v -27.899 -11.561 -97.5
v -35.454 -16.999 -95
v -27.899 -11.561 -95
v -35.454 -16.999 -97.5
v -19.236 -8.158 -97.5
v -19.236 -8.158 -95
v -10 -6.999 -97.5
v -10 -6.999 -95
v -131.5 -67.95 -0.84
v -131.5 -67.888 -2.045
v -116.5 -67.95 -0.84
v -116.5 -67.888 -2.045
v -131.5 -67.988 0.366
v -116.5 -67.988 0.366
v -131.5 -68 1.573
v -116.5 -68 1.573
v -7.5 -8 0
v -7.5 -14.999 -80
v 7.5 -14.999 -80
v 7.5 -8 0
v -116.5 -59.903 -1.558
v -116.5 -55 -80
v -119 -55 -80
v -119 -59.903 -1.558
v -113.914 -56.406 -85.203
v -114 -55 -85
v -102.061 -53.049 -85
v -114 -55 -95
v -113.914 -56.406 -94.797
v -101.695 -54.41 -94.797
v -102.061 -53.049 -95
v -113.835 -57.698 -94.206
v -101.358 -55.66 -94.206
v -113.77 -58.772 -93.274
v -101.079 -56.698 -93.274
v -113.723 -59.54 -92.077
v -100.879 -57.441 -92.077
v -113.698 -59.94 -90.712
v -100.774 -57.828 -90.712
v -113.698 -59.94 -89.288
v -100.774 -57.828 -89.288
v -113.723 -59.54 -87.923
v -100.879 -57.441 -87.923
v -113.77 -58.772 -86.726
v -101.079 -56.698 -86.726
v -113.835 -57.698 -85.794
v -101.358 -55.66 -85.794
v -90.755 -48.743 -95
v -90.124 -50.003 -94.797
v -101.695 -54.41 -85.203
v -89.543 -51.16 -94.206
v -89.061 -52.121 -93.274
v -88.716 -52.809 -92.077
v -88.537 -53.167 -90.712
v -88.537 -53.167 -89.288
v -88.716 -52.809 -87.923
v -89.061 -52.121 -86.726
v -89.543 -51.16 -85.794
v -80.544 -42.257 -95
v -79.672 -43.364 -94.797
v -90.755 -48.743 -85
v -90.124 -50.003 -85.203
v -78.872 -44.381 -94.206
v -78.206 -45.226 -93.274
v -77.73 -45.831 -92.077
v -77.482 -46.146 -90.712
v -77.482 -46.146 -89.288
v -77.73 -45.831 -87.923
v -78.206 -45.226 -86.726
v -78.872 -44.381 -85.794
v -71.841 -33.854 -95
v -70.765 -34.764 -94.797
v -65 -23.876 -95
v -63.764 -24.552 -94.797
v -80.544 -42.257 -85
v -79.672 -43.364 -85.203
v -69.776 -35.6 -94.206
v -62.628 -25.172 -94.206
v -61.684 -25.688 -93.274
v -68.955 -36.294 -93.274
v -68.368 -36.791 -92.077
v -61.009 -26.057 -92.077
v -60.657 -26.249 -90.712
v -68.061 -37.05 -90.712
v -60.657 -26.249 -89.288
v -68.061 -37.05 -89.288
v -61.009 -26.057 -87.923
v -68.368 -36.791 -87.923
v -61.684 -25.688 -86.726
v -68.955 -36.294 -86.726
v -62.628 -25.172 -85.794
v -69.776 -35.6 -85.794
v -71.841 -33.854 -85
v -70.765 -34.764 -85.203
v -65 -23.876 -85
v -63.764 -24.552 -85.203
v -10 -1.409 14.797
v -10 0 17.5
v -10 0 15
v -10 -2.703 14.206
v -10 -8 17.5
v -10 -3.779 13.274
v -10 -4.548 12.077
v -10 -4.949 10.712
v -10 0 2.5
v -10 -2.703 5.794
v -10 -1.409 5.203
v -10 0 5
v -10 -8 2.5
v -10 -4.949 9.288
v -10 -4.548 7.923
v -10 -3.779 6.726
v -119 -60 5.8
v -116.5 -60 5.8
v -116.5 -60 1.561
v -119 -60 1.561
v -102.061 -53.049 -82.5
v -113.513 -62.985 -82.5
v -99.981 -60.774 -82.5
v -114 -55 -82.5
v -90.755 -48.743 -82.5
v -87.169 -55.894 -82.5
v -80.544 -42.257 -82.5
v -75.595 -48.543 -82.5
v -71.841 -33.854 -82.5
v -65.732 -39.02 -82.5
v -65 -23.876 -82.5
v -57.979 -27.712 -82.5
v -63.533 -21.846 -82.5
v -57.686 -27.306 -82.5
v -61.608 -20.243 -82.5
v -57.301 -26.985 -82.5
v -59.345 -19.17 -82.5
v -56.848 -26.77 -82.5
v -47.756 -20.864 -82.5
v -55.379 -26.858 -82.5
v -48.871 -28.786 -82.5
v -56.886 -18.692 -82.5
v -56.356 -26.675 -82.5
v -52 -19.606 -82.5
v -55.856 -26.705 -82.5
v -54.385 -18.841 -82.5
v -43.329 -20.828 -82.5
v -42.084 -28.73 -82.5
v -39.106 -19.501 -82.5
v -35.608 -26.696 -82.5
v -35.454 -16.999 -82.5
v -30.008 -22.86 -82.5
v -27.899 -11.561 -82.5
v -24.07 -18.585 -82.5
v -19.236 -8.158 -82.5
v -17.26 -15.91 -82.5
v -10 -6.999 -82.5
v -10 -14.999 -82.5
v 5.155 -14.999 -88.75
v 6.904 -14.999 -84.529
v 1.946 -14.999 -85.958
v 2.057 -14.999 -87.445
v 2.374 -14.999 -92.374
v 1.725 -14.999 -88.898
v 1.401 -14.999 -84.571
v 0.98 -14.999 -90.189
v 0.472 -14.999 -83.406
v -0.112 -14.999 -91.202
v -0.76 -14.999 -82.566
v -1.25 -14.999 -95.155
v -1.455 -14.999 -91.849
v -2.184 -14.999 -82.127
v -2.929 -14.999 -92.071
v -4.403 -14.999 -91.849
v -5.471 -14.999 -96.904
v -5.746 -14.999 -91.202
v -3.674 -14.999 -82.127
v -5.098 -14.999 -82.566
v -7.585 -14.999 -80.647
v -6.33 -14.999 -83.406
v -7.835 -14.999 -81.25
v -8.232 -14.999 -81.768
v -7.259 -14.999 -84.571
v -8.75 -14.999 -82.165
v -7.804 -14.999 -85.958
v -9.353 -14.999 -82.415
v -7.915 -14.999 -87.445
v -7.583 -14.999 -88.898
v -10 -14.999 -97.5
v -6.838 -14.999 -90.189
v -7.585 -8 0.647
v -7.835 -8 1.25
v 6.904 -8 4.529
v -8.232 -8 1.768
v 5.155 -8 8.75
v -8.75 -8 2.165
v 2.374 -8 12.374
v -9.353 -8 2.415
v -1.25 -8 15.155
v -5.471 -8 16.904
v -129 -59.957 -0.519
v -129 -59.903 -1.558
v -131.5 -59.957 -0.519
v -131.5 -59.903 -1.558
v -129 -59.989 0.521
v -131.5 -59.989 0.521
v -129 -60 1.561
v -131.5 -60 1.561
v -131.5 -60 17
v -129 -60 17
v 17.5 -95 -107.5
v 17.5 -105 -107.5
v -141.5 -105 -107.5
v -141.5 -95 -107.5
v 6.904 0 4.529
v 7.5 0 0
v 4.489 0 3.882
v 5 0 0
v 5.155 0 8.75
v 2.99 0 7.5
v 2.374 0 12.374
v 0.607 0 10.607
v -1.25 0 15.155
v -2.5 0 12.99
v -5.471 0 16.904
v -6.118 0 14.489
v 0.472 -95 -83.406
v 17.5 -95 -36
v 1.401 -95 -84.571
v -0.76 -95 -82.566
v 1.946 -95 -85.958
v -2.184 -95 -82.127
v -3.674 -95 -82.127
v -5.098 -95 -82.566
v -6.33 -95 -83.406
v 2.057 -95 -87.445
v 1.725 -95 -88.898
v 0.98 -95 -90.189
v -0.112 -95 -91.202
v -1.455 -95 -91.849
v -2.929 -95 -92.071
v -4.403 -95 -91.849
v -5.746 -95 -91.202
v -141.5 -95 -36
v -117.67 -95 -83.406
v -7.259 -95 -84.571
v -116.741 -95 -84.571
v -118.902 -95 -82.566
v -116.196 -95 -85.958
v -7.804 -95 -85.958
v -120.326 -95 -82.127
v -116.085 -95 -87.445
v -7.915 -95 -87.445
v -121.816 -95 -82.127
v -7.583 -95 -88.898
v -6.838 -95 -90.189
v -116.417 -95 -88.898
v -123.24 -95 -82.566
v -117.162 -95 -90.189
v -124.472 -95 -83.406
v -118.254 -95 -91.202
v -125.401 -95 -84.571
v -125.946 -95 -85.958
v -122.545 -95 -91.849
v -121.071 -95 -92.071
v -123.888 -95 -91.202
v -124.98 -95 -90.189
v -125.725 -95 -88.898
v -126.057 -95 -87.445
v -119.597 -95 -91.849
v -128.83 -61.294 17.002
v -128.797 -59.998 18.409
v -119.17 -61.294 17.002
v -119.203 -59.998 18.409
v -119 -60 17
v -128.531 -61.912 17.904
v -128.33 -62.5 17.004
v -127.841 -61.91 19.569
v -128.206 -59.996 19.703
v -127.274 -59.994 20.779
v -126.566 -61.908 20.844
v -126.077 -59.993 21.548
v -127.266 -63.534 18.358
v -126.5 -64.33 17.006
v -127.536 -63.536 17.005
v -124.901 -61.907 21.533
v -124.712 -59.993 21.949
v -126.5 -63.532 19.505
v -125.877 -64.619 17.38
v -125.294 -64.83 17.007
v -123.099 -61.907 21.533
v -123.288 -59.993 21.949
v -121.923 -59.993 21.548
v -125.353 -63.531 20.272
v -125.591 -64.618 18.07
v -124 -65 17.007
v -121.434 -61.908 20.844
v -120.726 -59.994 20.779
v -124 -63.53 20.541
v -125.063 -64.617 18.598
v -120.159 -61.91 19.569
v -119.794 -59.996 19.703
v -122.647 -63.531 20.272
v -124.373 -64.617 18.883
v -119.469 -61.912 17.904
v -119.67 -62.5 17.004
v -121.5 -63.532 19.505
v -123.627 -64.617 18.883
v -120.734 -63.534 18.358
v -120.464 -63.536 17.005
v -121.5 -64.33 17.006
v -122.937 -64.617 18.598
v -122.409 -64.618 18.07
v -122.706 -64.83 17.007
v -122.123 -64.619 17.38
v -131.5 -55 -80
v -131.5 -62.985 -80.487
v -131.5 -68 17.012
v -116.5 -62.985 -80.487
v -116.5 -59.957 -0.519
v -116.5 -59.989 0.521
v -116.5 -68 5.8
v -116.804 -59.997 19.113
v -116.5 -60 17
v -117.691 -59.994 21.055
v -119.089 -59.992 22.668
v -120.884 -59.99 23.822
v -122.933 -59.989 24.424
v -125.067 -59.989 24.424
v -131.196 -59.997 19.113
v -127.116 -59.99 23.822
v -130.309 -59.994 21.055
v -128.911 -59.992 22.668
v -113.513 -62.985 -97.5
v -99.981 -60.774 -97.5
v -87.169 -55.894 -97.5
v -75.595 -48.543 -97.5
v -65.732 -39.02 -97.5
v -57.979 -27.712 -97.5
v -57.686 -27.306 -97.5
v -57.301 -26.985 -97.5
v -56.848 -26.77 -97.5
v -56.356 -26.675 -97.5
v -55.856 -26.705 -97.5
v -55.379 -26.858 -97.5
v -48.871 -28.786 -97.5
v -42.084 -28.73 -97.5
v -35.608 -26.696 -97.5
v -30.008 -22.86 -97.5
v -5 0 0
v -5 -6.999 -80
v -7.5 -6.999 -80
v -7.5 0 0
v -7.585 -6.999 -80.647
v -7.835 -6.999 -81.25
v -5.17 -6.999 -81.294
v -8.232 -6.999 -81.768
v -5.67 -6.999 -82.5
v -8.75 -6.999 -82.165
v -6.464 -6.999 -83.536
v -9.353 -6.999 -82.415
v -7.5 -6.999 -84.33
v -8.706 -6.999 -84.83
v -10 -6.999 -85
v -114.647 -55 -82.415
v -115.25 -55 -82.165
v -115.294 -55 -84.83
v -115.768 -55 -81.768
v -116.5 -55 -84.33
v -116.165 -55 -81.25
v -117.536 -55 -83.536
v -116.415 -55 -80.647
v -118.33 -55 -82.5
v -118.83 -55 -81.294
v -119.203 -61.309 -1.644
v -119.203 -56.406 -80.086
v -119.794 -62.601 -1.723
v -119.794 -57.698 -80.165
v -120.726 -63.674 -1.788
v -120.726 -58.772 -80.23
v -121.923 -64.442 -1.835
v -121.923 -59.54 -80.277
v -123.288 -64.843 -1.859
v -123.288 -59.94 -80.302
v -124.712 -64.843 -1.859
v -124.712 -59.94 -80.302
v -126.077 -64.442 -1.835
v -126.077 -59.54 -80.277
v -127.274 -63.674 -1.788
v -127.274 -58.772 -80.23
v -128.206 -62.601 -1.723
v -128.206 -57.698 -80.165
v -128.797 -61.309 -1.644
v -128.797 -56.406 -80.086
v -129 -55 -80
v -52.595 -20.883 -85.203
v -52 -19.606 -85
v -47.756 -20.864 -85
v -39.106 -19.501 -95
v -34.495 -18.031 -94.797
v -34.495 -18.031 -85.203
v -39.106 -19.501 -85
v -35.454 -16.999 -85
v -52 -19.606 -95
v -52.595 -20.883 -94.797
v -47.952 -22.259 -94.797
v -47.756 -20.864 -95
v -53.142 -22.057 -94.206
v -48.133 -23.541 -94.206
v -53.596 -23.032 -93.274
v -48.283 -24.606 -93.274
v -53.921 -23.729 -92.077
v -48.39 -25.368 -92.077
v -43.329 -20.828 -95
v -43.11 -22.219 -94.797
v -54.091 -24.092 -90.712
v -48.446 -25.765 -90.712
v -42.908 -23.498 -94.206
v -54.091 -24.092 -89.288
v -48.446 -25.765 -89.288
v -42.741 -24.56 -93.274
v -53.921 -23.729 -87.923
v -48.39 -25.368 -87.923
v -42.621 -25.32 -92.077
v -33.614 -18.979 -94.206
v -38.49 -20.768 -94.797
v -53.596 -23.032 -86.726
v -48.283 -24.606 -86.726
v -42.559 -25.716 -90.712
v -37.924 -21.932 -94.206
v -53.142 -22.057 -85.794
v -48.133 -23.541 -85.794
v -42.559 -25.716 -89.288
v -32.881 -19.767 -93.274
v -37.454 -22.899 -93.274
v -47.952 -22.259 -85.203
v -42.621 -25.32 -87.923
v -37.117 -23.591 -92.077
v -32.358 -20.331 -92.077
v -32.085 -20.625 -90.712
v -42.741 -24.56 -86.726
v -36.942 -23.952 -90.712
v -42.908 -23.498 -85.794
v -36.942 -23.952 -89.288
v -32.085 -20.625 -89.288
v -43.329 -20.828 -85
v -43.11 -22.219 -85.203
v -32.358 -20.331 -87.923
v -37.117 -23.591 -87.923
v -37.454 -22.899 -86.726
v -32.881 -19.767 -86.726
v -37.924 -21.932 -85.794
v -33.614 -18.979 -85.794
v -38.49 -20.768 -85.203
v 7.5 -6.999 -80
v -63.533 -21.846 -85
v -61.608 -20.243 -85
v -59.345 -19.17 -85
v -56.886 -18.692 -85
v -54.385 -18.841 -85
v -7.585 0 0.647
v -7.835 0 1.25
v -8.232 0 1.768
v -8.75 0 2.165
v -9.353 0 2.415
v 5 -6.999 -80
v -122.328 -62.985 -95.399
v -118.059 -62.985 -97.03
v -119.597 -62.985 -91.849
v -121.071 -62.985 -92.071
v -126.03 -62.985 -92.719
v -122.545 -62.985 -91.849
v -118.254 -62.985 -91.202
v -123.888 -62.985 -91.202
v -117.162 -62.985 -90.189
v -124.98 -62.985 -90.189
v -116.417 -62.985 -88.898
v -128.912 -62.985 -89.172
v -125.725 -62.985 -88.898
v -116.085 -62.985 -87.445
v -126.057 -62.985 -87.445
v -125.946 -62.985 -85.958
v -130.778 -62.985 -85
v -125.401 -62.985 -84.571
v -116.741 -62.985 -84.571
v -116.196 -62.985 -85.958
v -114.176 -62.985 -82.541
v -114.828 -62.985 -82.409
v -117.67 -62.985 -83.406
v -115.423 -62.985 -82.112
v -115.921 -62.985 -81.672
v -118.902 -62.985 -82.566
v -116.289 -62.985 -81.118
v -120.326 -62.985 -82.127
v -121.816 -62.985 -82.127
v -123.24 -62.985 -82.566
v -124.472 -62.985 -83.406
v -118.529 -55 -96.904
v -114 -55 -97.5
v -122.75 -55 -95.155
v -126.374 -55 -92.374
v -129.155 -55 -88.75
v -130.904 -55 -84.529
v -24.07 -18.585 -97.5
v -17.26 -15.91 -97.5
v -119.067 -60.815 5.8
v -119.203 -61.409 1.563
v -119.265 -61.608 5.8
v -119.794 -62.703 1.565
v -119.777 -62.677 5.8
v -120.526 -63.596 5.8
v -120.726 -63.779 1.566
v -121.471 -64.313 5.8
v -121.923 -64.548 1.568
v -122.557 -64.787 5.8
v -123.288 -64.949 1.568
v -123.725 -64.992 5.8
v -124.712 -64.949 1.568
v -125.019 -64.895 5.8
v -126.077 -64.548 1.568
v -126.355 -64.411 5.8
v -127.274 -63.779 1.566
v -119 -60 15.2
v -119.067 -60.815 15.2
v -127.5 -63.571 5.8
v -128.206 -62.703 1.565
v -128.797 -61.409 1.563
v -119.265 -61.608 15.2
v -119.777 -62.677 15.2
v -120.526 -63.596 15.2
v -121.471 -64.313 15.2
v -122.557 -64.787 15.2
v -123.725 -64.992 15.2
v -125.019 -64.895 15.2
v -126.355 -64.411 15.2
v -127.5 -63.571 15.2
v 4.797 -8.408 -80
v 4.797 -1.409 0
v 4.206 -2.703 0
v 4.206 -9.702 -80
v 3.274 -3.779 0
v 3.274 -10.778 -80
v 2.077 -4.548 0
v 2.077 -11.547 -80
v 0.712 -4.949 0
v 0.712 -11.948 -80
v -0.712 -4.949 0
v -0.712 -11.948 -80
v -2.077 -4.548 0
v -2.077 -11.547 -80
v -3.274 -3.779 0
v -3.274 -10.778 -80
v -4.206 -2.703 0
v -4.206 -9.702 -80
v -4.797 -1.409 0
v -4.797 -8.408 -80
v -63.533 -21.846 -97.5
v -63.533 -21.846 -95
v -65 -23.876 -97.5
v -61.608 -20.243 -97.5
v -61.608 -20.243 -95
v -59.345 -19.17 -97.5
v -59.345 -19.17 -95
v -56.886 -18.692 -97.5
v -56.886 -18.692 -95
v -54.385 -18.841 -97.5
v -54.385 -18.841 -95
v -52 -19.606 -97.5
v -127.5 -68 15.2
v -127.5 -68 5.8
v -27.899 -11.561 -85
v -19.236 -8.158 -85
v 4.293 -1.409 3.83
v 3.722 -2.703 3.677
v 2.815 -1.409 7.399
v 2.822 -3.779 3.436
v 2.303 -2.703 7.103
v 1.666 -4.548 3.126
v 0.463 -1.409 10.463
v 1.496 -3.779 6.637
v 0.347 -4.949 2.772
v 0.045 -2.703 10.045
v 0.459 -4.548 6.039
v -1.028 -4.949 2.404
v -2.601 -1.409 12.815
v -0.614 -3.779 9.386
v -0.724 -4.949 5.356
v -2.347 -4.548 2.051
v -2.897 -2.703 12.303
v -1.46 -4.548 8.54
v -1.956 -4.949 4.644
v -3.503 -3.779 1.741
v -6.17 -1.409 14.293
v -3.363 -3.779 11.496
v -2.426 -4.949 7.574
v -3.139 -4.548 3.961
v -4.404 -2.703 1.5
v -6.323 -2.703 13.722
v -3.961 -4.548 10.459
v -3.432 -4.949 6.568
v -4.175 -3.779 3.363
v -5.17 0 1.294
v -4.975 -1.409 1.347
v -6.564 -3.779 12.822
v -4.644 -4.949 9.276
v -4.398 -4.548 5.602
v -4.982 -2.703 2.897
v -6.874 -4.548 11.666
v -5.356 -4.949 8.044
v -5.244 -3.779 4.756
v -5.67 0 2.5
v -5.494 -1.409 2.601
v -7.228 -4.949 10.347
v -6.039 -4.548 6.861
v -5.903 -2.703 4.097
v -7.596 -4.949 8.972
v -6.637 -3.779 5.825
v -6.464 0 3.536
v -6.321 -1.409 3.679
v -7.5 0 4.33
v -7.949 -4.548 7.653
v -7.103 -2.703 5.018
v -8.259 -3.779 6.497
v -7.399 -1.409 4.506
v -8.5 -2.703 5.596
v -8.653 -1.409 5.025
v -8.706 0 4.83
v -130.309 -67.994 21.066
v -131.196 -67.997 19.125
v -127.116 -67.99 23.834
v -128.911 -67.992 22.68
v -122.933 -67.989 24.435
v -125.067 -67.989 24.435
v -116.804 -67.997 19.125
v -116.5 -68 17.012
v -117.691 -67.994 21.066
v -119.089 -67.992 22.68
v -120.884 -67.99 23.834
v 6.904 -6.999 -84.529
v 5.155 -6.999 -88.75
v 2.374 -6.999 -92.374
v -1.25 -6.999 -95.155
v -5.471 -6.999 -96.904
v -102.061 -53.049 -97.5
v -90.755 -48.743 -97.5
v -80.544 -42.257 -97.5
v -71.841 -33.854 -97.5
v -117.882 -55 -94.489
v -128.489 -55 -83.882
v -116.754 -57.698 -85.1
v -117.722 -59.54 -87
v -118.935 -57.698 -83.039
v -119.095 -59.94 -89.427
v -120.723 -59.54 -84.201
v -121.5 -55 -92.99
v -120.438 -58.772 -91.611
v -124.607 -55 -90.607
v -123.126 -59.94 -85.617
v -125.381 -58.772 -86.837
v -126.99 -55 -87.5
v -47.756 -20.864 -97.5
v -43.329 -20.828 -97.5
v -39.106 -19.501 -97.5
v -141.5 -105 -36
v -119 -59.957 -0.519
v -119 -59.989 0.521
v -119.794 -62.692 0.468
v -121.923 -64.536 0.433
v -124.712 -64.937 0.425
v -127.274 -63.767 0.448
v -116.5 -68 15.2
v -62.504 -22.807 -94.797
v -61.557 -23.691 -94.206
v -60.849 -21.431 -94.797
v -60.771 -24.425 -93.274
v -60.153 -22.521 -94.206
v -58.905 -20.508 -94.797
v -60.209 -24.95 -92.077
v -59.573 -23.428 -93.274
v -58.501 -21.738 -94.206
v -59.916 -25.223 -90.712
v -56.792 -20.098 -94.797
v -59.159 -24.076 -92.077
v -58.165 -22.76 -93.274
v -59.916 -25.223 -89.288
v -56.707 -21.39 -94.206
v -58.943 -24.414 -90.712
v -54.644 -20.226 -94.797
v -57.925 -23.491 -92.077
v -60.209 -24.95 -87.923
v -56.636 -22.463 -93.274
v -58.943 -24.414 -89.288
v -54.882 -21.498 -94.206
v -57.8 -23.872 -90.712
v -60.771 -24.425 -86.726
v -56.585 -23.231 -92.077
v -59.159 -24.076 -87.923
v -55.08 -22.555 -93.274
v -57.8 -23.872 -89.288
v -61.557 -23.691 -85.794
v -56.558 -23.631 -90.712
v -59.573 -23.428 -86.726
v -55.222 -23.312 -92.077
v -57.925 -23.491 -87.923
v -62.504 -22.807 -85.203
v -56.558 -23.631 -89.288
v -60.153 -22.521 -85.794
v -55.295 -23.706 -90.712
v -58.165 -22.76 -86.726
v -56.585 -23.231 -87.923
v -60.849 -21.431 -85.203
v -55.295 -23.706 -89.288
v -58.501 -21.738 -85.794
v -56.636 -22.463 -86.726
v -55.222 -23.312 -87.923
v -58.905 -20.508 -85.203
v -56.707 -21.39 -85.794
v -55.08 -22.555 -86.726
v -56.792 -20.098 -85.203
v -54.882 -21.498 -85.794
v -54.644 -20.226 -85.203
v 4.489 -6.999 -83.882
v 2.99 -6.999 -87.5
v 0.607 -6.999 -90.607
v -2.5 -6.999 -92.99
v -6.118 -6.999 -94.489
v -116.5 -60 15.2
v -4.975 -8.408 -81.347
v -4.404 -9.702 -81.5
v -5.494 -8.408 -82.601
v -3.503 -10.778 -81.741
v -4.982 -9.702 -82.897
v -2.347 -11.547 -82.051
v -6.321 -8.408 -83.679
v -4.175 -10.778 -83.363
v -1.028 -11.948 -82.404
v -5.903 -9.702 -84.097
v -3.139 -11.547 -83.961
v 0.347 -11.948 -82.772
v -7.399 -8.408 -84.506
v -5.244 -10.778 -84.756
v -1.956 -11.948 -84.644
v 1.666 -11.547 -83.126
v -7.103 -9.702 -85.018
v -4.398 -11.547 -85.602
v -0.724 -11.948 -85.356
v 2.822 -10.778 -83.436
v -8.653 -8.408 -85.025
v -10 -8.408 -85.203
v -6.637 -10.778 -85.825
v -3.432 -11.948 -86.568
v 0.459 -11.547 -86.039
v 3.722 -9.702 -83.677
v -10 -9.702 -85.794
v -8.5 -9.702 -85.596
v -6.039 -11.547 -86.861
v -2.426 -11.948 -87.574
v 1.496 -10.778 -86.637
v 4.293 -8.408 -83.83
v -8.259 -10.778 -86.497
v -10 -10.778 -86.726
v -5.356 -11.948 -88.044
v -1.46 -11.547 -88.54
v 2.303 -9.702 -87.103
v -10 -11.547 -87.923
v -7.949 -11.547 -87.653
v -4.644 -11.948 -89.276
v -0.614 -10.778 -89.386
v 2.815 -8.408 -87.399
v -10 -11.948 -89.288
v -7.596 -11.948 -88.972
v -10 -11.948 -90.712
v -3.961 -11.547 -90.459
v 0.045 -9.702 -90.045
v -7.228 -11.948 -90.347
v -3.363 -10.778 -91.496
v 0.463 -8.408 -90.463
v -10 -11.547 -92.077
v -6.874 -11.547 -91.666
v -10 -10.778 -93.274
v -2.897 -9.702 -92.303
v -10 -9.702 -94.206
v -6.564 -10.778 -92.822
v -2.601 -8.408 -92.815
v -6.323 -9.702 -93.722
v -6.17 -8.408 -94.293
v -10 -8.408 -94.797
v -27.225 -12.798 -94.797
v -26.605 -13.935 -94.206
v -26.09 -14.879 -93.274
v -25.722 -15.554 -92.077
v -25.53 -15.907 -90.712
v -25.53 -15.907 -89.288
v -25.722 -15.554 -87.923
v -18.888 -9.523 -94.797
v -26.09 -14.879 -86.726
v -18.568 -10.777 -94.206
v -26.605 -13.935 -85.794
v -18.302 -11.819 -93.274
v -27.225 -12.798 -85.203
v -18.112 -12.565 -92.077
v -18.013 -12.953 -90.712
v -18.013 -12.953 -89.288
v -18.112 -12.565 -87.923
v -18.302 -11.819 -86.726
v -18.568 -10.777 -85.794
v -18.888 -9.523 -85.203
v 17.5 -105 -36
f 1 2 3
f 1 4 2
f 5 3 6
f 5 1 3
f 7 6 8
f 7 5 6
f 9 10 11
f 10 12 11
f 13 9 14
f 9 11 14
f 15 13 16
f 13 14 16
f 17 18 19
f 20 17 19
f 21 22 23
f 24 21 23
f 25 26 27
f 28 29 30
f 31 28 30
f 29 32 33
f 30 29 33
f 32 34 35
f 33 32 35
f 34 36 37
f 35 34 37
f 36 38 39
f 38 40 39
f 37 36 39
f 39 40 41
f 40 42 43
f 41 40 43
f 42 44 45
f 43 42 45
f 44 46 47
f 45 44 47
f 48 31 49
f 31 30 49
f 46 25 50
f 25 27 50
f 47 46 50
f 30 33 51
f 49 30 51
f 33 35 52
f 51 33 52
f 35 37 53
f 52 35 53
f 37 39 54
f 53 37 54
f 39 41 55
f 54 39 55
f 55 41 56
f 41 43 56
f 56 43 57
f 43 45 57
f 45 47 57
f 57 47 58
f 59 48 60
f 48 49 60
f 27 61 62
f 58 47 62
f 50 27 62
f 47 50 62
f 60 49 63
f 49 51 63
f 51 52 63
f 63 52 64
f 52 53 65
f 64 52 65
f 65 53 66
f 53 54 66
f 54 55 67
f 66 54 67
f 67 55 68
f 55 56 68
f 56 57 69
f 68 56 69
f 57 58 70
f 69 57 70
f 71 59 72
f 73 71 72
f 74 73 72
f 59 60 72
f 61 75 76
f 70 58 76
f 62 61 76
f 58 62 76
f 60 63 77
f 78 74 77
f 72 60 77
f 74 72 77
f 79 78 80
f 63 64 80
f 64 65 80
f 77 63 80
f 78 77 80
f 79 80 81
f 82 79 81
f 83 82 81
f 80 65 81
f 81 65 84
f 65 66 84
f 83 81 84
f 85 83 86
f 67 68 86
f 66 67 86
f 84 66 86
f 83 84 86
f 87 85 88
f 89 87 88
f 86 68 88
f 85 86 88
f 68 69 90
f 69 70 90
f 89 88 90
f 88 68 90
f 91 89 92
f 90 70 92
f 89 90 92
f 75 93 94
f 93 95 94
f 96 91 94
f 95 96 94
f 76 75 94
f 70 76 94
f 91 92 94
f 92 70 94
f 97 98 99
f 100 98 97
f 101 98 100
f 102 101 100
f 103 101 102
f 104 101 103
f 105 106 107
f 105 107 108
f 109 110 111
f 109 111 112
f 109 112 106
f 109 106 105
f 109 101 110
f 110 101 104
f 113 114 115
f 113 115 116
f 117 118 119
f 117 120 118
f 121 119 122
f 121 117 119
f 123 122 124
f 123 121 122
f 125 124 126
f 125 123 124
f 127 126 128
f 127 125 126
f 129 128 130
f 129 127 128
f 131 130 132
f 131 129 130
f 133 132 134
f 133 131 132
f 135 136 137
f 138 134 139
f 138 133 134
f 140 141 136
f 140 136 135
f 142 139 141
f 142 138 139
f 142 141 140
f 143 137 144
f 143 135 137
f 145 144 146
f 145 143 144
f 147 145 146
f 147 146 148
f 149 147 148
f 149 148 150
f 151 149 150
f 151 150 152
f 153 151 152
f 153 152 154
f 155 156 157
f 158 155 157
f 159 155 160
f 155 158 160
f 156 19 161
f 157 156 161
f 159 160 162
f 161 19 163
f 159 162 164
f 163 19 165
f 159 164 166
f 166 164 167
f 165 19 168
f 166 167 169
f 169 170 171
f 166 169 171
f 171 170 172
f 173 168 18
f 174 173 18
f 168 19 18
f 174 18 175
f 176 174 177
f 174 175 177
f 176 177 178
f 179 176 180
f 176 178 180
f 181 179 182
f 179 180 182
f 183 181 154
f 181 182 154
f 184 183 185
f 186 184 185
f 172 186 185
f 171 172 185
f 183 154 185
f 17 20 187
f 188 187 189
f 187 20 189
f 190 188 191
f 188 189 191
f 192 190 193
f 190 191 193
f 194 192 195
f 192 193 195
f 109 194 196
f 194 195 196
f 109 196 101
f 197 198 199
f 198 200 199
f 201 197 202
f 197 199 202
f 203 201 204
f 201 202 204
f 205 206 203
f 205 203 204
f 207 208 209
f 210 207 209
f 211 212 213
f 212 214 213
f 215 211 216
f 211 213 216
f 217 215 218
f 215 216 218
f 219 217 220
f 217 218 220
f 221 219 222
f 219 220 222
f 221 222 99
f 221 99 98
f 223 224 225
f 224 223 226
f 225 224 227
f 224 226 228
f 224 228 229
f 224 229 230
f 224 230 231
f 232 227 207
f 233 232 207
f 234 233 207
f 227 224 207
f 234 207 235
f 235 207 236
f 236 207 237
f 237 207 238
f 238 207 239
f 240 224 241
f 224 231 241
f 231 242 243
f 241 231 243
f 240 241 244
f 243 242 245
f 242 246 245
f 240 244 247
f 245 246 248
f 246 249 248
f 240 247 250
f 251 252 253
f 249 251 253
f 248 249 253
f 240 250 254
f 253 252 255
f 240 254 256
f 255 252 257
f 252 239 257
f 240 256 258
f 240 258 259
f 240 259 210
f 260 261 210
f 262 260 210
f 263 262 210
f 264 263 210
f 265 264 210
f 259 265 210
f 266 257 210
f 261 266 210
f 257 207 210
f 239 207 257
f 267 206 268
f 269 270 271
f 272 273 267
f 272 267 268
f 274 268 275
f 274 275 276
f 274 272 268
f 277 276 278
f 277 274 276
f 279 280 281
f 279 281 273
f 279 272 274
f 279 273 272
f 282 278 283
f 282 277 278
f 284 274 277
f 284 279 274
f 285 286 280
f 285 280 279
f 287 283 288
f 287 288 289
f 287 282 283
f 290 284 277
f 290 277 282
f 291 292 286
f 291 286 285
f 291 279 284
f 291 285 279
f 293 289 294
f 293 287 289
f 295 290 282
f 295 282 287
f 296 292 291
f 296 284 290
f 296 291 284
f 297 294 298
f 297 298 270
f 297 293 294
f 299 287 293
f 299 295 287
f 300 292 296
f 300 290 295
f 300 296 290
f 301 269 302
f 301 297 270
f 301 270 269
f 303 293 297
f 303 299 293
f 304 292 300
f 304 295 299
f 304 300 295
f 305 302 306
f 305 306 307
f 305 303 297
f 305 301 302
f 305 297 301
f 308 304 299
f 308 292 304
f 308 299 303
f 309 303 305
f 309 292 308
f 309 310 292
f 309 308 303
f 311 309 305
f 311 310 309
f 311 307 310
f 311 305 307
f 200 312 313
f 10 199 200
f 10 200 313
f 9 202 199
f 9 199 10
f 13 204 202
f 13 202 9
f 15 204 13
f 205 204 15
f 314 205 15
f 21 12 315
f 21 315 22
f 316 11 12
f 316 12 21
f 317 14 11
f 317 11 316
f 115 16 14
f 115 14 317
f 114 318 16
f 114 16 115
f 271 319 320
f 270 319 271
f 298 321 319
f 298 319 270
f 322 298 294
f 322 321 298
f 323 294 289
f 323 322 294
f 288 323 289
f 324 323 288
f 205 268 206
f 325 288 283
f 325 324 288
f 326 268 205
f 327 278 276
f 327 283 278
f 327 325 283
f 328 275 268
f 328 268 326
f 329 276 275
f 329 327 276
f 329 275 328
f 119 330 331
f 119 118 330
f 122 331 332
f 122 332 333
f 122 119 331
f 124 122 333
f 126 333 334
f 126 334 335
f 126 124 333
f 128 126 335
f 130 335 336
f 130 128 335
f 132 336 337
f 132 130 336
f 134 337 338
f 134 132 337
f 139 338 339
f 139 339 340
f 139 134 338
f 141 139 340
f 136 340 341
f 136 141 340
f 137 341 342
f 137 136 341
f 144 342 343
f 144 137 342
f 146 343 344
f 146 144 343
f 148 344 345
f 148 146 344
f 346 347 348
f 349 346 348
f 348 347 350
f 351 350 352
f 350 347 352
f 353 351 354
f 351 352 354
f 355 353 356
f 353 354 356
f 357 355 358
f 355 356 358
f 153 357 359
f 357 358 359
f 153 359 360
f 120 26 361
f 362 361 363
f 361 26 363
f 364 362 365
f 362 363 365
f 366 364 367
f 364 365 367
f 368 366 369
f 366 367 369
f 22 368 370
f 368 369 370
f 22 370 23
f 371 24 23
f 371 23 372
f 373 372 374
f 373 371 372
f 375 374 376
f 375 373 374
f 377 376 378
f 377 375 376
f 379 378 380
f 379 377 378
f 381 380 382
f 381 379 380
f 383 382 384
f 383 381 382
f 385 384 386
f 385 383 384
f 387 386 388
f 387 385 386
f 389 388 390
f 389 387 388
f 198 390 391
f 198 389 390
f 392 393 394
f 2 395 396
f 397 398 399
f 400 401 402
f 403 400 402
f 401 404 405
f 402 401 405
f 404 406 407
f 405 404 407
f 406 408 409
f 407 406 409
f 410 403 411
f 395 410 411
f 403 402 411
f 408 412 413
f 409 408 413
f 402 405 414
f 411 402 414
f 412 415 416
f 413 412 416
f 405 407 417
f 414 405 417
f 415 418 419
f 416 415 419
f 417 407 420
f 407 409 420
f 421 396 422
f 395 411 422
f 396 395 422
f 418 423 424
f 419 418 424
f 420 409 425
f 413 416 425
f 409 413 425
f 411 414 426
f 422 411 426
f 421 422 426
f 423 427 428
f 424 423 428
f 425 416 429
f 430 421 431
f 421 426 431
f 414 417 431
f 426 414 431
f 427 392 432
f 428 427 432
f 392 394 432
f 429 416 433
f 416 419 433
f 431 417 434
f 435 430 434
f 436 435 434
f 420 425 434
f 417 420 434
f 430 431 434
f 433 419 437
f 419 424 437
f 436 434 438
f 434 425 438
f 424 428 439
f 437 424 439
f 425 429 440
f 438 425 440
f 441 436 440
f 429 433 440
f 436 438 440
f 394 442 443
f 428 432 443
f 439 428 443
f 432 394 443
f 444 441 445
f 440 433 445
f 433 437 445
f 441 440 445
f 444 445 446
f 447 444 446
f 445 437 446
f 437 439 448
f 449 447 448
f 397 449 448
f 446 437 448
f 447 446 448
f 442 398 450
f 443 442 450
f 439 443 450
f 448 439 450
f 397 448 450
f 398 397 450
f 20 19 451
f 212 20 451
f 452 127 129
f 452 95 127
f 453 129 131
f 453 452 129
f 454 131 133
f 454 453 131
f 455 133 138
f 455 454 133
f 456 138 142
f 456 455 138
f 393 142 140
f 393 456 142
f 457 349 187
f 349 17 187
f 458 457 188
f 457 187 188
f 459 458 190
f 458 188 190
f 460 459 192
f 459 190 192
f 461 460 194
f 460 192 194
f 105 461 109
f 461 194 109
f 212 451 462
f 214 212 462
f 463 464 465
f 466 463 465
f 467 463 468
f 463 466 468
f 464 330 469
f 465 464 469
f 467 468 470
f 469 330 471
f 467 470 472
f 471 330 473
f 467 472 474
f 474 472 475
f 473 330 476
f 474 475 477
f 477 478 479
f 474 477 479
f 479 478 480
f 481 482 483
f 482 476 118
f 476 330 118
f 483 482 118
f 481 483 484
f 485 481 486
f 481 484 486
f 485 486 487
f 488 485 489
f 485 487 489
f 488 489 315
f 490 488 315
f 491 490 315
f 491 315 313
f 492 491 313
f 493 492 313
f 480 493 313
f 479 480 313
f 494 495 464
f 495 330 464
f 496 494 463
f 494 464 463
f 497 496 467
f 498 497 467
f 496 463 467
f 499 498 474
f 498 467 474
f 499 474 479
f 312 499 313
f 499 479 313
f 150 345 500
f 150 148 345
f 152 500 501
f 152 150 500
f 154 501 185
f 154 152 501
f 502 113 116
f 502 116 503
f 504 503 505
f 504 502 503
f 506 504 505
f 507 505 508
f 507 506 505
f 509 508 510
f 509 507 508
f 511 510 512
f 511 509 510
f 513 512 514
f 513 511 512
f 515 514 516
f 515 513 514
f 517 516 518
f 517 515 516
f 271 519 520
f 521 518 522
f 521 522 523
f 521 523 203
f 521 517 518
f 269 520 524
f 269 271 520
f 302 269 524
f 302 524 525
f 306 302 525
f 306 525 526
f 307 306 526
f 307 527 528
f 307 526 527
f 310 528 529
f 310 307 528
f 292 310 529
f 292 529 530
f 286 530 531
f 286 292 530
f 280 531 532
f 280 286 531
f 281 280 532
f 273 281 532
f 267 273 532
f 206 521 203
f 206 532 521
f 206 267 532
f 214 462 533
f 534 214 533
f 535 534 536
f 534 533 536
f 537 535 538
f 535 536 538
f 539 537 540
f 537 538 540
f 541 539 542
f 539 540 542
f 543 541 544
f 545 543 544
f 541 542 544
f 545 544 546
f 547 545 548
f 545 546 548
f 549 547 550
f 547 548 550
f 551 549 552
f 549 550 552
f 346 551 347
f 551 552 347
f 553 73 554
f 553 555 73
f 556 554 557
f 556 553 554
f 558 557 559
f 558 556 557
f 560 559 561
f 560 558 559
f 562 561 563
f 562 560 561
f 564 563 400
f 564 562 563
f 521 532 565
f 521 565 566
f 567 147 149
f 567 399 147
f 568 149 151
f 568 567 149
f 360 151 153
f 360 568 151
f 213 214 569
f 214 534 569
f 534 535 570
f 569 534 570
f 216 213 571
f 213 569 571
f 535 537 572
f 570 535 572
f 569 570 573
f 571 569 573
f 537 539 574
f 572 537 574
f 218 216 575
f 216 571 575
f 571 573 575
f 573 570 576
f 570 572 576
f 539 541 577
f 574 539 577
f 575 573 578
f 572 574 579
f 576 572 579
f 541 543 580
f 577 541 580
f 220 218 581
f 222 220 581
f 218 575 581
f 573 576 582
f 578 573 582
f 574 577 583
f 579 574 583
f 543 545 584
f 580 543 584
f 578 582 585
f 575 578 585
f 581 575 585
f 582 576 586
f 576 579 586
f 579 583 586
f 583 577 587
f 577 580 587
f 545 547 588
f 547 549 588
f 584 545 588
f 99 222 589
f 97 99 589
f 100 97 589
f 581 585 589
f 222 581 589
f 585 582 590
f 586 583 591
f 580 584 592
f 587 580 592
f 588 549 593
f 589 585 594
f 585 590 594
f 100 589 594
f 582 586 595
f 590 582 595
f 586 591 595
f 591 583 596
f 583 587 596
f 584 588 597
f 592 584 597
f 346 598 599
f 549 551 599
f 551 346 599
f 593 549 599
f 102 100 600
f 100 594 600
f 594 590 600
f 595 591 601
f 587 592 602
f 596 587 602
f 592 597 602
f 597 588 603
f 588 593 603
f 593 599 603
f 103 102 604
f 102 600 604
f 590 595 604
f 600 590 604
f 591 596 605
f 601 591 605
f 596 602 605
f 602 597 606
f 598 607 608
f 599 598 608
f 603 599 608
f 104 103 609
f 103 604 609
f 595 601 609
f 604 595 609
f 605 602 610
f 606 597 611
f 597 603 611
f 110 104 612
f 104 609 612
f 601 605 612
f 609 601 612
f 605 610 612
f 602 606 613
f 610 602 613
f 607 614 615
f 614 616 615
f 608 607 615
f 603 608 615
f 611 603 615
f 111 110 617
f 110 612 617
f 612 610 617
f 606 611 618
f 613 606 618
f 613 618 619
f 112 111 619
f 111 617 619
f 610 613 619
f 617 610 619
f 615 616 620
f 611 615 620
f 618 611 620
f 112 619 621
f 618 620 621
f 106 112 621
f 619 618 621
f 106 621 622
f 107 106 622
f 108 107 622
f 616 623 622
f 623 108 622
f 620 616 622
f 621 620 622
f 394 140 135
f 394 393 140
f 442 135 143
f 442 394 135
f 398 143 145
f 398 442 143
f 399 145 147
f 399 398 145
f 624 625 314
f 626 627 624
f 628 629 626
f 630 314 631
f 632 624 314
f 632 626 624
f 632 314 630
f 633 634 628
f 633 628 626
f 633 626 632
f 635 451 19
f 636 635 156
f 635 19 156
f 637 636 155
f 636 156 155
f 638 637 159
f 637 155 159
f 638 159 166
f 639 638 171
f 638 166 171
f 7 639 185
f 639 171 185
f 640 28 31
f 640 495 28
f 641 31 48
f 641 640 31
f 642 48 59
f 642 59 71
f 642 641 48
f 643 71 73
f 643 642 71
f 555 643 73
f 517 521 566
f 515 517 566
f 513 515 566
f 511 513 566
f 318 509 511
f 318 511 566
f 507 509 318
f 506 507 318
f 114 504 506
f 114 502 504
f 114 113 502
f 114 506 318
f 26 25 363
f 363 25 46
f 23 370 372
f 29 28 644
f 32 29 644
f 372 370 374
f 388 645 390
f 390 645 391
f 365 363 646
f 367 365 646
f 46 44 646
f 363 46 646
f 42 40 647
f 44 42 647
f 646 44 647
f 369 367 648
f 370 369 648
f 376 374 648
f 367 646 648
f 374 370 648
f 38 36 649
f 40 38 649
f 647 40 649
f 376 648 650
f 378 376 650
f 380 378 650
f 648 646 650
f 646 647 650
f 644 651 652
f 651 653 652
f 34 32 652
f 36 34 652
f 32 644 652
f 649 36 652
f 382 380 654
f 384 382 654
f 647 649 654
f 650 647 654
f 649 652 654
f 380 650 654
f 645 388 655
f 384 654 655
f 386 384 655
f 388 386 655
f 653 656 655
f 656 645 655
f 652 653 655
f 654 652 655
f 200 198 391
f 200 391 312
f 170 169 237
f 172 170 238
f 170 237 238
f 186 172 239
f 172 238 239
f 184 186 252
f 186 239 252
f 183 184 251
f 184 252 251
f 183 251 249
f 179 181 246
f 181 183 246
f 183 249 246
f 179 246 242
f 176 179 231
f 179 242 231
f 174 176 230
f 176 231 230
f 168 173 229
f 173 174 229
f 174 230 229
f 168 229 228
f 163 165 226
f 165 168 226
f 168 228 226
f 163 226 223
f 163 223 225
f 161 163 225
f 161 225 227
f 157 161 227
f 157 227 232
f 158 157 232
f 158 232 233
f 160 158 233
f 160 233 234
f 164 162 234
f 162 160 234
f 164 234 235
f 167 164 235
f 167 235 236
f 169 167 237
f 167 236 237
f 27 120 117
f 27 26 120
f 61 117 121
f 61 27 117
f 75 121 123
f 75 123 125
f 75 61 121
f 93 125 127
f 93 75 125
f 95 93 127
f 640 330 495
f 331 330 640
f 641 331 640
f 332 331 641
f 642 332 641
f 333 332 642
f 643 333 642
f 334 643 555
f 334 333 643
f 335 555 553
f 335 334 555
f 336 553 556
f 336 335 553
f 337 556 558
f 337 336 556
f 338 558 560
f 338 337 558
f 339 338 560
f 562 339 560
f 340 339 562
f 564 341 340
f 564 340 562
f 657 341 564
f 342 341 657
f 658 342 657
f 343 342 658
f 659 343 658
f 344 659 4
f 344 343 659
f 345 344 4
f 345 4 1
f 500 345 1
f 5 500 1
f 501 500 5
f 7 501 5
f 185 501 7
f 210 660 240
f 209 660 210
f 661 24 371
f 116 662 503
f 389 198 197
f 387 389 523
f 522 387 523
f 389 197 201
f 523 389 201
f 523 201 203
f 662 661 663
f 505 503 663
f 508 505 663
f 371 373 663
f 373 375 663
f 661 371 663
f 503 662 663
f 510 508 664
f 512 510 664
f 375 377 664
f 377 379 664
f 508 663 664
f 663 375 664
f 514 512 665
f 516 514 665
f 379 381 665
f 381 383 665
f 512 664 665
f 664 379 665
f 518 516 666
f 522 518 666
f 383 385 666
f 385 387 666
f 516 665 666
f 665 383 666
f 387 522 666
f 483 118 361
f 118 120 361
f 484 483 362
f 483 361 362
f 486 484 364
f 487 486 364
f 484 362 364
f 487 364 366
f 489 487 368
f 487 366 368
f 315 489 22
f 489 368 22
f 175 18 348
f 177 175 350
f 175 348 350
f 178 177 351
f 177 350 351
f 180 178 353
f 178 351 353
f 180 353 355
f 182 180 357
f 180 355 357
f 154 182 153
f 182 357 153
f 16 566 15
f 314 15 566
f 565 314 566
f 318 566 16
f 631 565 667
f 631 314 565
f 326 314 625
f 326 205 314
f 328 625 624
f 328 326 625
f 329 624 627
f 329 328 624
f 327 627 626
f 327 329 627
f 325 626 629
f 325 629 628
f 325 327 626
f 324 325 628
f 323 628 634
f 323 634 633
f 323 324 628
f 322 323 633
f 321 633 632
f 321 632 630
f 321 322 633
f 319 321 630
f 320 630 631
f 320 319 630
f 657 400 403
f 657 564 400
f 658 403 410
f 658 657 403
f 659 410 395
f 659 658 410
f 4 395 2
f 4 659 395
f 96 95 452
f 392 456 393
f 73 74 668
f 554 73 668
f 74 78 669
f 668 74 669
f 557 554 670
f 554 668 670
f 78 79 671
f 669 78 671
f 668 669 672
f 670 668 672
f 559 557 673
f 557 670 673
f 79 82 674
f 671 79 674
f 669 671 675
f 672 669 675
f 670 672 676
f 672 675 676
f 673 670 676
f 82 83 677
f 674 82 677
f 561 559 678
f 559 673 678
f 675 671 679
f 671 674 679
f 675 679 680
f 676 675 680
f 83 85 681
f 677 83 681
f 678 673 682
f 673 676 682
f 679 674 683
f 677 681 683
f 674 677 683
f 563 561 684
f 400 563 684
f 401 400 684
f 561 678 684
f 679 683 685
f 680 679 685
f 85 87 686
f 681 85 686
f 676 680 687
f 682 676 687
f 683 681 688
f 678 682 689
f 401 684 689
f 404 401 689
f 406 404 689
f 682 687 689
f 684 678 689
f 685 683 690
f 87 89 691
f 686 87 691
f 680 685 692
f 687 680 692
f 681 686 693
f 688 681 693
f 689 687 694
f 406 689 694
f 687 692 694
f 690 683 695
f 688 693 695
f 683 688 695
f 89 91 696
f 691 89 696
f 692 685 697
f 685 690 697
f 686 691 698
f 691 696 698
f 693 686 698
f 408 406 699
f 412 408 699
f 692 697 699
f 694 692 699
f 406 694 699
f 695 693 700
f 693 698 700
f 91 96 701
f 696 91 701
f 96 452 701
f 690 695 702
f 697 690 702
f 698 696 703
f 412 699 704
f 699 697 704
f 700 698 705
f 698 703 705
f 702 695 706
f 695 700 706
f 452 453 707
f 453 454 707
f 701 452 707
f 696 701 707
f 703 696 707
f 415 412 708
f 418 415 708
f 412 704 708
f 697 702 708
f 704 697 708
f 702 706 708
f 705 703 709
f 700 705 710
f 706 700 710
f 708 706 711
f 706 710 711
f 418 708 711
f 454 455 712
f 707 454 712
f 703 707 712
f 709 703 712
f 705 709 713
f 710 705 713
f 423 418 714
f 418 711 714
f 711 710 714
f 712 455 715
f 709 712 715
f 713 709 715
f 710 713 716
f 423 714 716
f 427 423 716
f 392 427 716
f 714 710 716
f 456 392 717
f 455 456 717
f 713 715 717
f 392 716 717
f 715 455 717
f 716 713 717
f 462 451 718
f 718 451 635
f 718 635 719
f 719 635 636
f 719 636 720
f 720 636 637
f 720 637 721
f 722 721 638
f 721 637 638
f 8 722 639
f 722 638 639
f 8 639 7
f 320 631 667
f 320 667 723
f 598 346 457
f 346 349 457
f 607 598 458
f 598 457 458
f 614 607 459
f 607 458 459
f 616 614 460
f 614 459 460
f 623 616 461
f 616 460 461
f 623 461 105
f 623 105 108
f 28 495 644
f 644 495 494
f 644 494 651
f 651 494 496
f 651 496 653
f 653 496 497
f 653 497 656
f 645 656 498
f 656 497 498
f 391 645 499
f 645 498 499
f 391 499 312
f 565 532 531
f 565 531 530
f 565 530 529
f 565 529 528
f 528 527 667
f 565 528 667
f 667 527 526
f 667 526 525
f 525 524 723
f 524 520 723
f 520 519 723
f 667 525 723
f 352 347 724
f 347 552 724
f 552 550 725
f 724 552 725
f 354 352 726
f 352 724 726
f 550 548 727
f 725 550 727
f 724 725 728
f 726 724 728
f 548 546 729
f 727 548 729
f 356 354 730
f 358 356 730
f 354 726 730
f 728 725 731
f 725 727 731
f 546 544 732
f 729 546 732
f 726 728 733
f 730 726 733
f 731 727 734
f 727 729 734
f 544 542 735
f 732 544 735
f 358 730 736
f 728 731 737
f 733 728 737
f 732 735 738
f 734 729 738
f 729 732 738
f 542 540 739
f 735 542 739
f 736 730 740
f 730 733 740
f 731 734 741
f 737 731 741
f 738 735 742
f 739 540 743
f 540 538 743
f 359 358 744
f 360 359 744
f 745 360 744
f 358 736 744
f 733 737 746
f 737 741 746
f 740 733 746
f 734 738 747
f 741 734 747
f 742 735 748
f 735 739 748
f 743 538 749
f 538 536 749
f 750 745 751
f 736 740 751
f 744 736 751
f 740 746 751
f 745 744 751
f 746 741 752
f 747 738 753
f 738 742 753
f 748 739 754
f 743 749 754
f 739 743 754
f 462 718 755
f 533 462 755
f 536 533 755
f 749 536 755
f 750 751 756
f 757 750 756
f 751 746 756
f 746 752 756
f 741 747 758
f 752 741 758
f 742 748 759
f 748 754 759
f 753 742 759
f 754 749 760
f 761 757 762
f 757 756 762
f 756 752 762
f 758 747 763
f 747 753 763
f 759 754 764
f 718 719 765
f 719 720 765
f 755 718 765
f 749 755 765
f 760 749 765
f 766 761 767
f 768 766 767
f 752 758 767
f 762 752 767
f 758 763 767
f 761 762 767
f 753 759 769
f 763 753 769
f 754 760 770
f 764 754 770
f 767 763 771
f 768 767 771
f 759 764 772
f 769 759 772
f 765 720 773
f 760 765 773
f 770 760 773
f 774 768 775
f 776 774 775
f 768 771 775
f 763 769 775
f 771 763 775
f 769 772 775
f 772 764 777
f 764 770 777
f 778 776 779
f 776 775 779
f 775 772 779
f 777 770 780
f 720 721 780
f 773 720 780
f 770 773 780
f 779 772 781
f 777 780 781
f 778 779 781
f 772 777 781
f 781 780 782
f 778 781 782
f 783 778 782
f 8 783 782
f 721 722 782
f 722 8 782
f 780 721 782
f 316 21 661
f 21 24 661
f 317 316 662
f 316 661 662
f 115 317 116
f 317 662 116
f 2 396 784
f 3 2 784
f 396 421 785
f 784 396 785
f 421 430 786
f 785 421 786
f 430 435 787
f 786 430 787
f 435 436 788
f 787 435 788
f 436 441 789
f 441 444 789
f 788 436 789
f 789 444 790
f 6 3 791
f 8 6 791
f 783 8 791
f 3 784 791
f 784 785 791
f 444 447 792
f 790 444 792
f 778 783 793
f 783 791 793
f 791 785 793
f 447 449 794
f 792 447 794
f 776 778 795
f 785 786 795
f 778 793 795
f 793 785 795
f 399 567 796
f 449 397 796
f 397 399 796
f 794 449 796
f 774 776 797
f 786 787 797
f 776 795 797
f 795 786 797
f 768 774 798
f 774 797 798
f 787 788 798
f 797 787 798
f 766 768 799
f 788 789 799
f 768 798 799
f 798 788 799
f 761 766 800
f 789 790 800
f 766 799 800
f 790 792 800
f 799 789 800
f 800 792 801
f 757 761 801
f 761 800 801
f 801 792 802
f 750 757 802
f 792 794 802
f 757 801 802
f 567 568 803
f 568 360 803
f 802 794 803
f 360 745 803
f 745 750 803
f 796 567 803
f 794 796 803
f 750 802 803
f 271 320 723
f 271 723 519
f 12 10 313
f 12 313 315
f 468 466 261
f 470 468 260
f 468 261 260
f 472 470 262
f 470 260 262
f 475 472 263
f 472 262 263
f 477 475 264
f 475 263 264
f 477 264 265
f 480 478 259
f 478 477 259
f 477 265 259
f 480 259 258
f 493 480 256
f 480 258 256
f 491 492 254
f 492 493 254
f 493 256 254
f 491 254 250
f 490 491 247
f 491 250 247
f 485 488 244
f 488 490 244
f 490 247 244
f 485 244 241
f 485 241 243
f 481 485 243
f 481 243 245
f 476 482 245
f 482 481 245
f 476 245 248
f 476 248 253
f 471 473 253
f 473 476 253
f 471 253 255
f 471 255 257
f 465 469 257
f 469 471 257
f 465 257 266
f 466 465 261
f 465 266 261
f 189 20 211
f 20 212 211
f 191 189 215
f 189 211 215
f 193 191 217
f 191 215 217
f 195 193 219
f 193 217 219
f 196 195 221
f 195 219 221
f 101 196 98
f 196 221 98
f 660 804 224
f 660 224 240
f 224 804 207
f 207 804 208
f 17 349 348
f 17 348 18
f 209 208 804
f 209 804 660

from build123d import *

# Parameters (mm, degrees)
REVOLVE_1_ANGLE     = 180
CUT_EXTRUDE_1_REACH = 179.268
SKETCH_26_W         = 11
SKETCH_26_H         = 9.4
SKETCH_30_W         = 159
SKETCH_30_H         = 71.5
EXTRUDE_3_DEPTH     = 10
EXTRUDE_4_REACH     = 203.503
SKETCH_31_R         = 5


# Read off the part's stored shape, not the designer's step: 旋轉1
with BuildPart() as part:
    # 掃出1: sweep along a path in 草圖1
    with BuildLine(Plane(origin=(0, 0, 0), x_dir=(0, 0, -1), z_dir=(1, 0, 0))) as sweep_1_path:
        Line((0, 0), (80, -6.999093082))
    # 草圖8 → 掃出1 (sweep)
    with BuildSketch(Plane.XY):
        with BuildLine():
            Line((5, 0), (7.5, 0))
            Line((7.5, 0), (7.5, -8))
            Line((7.5, -8), (-7.5, -8))
            Line((-7.5, -8), (-7.5, 0))
            Line((-7.5, 0), (-5, 0))
            ThreePointArc((-5, 0), (0, -5), (5, 0))
        make_face()
    sweep(path=sweep_1_path.line)

    # 掃出2: sweep along a path in 草圖3
    with BuildLine(Plane(origin=(0, -6.999093082, 0), x_dir=(1, 0, 0), z_dir=(0, 1, 0))) as sweep_2_path:
        ThreePointArc((0, 80), (-2.928932188, 87.071067812), (-10, 90))
    # 草圖15 → 掃出2 (sweep)
    with BuildSketch(Plane(origin=(0, 0, -80), x_dir=(-1, 0, 0), z_dir=(0, 0, -1))):
        with BuildLine():
            Line((7.5, -14.999093082), (7.5, -6.999093082))
            Line((7.5, -6.999093082), (5, -6.999093082))
            ThreePointArc((5, -6.999093082), (0, -11.999093082), (-5, -6.999093082))
            Line((-5, -6.999093082), (-7.5, -6.999093082))
            Line((-7.5, -6.999093082), (-7.5, -14.999093082))
            Line((-7.5, -14.999093082), (7.5, -14.999093082))
        make_face()
    sweep(path=sweep_2_path.line)

    # 掃出6: sweep along a path in 草圖4
    with BuildLine(Plane.XY.offset(-90)) as sweep_6_path:
        ThreePointArc((-114, -55), (-85.48557321, -45.758350859), (-65, -23.876351309))
        ThreePointArc((-65, -23.876351309), (-59.344635199, -19.169851161), (-52, -19.606461369))
        ThreePointArc((-52, -19.606461369), (-43.328947167, -20.827564341), (-35.453602253, -16.999093082))
        ThreePointArc((-35.453602253, -16.999093082), (-23.673751019, -9.588764492), (-10, -6.999093082))
    # 草圖19 → 掃出6 (sweep)
    with BuildSketch(Plane.ZY.offset(10)):
        with BuildLine():
            Line((-97.5, -14.999093082), (-82.5, -14.999093082))
            Line((-82.5, -14.999093082), (-82.5, -6.999093082))
            Line((-82.5, -6.999093082), (-85, -6.999093082))
            ThreePointArc((-85, -6.999093082), (-90, -11.999093082), (-95, -6.999093082))
            Line((-95, -6.999093082), (-97.5, -6.999093082))
            Line((-97.5, -6.999093082), (-97.5, -14.999093082))
        make_face()
    sweep(path=sweep_6_path.line)

    # 掃出7: sweep along a path in 草圖5
    with BuildLine(Plane(origin=(0, -55, 0), x_dir=(1, 0, 0), z_dir=(0, 1, 0))) as sweep_7_path:
        ThreePointArc((-114, 90), (-121.071067812, 87.071067812), (-124, 80))
    # 草圖20 → 掃出7 (sweep)
    with BuildSketch(Plane(origin=(-116.921360423, -7.136292944, 0), x_dir=(0, 0, 1), z_dir=(-0.9981425535898466, -0.06092161121589024, 0))):
        with BuildLine():
            Line((-97.5, -47.952776769), (-97.5, -55.952776769))
            Line((-97.5, -55.952776769), (-82.5, -55.952776769))
            Line((-82.5, -55.952776769), (-82.5, -47.952776769))
            Line((-82.5, -47.952776769), (-85, -47.952776769))
            ThreePointArc((-85, -47.952776769), (-90, -52.952776769), (-95, -47.952776769))
            Line((-95, -47.952776769), (-97.5, -47.952776769))
        make_face()
    sweep(path=sweep_7_path.line)

    # 掃出8: sweep along a path in 草圖6
    with BuildLine(Plane(origin=(-124, 0, 0), x_dir=(0, 0, -1), z_dir=(1, 0, 0))) as sweep_8_path:
        Line((80, -55), (1.557937214, -59.902628924))
        ThreePointArc((1.557937214, -59.902628924), (-0.000760155, -59.975651302), (-1.560977094, -60))
        Line((-1.560977094, -60), (-17, -60))
    # 草圖21 → 掃出8 (sweep)
    with BuildSketch(Plane(origin=(0, 4.660546858, -76.358619691), x_dir=(1, 0, 0), z_dir=(0, -0.06092161121589024, 0.9981425535898466))):
        with BuildLine():
            Line((-129, -59.771569345), (-131.5, -59.771569345))
            Line((-131.5, -59.771569345), (-131.5, -67.771569345))
            Line((-131.5, -67.771569345), (-116.5, -67.771569345))
            Line((-116.5, -67.771569345), (-116.5, -59.771569345))
            Line((-116.5, -59.771569345), (-119, -59.771569345))
            ThreePointArc((-119, -59.771569345), (-124, -64.771569345), (-129, -59.771569345))
        make_face()
    sweep(path=sweep_8_path.line)

    # 掃出9: sweep along a path in 草圖22
    with BuildLine(Plane(origin=(0, 0, 0), x_dir=(1, 0, 0), z_dir=(0, 1, 0))) as sweep_9_path:
        ThreePointArc((0, 0), (-2.928932188, -7.071067812), (-10, -10))
    # 草圖23 → 掃出9 (sweep)
    with BuildSketch(Plane.XY):
        with BuildLine():
            Line((-7.5, 0), (-7.5, -8))
            Line((-7.5, -8), (7.5, -8))
            Line((7.5, -8), (7.5, 0))
            Line((7.5, 0), (5, 0))
            ThreePointArc((5, 0), (0, -5), (-5, 0))
            Line((-5, 0), (-7.5, 0))
        make_face()
    sweep(path=sweep_9_path.line)

    # 旋轉1 outline → 旋轉1 (revolve)
    with BuildSketch(Plane(origin=(-124, 0.024682835, 16.912396843), x_dir=(-1, 0, 0), z_dir=(1.4532479245137334e-14, -0.0014594506721384598, -0.9999989350013008))):
        with BuildLine():
            Line((7.5, -68.024746762), (7.5, -60.024746762))
            Line((7.5, -60.024746762), (5, -60.024746762))
            ThreePointArc((5, -60.024746762), (3.535533906, -63.560280668), (0, -65.024746762))
            Line((0, -65.024746762), (0, -68.024746762))
            Line((0, -68.024746762), (7.5, -68.024746762))
        make_face()
    revolve(axis=Axis((-124, 0.024682835, 16.912396843), (0, 0.9999989350013008, -0.0014594506721384598)), revolution_arc=REVOLVE_1_ANGLE)

    # 草圖26 → 除料-伸長1 (cut, up to next)
    with BuildSketch(Plane(origin=(0, 0, 0), x_dir=(1, 0, 0), z_dir=(0, 1, 0)), mode=Mode.PRIVATE) as cut_extrude_1_sk1:
        with Locations((-122, -10.5)):
            Rectangle(SKETCH_26_W, SKETCH_26_H)
    cut_extrude_1_tool1 = extrude(cut_extrude_1_sk1.sketch, amount=-CUT_EXTRUDE_1_REACH, mode=Mode.PRIVATE) & part.part
    add(cut_extrude_1_tool1.solids().sort_by_distance((-122, 0, 10.5))[0], mode=Mode.SUBTRACT)

    # 草圖31 → 填料-伸長4 (add, up to next)
    with BuildSketch(Plane(origin=(0, -95, 0), x_dir=(1, 0, 0), z_dir=(0, 1, 0)), mode=Mode.PRIVATE) as extrude_4_sk1:
        with Locations(Location((-121.071067812, 87.071067812, 0), (0, 0, 90))):
            Circle(SKETCH_31_R)
    extrude_4_tool1 = extrude(extrude_4_sk1.sketch, amount=EXTRUDE_4_REACH, mode=Mode.PRIVATE) - part.part
    # 草圖31 → 填料-伸長4 (add, up to next)
    with BuildSketch(Plane(origin=(0, -95, 0), x_dir=(1, 0, 0), z_dir=(0, 1, 0)), mode=Mode.PRIVATE) as extrude_4_sk2:
        with Locations(Location((-2.928932188, 87.071067812, 0), (0, 0, 90))):
            Circle(SKETCH_31_R)
    extrude_4_tool2 = extrude(extrude_4_sk2.sketch, amount=EXTRUDE_4_REACH, mode=Mode.PRIVATE) - part.part


with BuildPart() as body_2:
    # 草圖30 → 填料-伸長3 (new body)
    with BuildSketch(Plane(origin=(0, -105, 0), x_dir=(-1, 0, 0), z_dir=(0, -1, 0))):
        with Locations((62, 71.75)):
            Rectangle(SKETCH_30_W, SKETCH_30_H)
    extrude(amount=-EXTRUDE_3_DEPTH)


with BuildPart() as part_1:
    add(part.part)

    add(body_2.part)  # 填料-伸長4 merges body 2
    add(extrude_4_tool1.solids().sort_by_distance((-121.071068, -95, -87.071068))[0])
    add(extrude_4_tool2.solids().sort_by_distance((-2.928932, -95, -87.071068))[0])


solid = part_1.part
